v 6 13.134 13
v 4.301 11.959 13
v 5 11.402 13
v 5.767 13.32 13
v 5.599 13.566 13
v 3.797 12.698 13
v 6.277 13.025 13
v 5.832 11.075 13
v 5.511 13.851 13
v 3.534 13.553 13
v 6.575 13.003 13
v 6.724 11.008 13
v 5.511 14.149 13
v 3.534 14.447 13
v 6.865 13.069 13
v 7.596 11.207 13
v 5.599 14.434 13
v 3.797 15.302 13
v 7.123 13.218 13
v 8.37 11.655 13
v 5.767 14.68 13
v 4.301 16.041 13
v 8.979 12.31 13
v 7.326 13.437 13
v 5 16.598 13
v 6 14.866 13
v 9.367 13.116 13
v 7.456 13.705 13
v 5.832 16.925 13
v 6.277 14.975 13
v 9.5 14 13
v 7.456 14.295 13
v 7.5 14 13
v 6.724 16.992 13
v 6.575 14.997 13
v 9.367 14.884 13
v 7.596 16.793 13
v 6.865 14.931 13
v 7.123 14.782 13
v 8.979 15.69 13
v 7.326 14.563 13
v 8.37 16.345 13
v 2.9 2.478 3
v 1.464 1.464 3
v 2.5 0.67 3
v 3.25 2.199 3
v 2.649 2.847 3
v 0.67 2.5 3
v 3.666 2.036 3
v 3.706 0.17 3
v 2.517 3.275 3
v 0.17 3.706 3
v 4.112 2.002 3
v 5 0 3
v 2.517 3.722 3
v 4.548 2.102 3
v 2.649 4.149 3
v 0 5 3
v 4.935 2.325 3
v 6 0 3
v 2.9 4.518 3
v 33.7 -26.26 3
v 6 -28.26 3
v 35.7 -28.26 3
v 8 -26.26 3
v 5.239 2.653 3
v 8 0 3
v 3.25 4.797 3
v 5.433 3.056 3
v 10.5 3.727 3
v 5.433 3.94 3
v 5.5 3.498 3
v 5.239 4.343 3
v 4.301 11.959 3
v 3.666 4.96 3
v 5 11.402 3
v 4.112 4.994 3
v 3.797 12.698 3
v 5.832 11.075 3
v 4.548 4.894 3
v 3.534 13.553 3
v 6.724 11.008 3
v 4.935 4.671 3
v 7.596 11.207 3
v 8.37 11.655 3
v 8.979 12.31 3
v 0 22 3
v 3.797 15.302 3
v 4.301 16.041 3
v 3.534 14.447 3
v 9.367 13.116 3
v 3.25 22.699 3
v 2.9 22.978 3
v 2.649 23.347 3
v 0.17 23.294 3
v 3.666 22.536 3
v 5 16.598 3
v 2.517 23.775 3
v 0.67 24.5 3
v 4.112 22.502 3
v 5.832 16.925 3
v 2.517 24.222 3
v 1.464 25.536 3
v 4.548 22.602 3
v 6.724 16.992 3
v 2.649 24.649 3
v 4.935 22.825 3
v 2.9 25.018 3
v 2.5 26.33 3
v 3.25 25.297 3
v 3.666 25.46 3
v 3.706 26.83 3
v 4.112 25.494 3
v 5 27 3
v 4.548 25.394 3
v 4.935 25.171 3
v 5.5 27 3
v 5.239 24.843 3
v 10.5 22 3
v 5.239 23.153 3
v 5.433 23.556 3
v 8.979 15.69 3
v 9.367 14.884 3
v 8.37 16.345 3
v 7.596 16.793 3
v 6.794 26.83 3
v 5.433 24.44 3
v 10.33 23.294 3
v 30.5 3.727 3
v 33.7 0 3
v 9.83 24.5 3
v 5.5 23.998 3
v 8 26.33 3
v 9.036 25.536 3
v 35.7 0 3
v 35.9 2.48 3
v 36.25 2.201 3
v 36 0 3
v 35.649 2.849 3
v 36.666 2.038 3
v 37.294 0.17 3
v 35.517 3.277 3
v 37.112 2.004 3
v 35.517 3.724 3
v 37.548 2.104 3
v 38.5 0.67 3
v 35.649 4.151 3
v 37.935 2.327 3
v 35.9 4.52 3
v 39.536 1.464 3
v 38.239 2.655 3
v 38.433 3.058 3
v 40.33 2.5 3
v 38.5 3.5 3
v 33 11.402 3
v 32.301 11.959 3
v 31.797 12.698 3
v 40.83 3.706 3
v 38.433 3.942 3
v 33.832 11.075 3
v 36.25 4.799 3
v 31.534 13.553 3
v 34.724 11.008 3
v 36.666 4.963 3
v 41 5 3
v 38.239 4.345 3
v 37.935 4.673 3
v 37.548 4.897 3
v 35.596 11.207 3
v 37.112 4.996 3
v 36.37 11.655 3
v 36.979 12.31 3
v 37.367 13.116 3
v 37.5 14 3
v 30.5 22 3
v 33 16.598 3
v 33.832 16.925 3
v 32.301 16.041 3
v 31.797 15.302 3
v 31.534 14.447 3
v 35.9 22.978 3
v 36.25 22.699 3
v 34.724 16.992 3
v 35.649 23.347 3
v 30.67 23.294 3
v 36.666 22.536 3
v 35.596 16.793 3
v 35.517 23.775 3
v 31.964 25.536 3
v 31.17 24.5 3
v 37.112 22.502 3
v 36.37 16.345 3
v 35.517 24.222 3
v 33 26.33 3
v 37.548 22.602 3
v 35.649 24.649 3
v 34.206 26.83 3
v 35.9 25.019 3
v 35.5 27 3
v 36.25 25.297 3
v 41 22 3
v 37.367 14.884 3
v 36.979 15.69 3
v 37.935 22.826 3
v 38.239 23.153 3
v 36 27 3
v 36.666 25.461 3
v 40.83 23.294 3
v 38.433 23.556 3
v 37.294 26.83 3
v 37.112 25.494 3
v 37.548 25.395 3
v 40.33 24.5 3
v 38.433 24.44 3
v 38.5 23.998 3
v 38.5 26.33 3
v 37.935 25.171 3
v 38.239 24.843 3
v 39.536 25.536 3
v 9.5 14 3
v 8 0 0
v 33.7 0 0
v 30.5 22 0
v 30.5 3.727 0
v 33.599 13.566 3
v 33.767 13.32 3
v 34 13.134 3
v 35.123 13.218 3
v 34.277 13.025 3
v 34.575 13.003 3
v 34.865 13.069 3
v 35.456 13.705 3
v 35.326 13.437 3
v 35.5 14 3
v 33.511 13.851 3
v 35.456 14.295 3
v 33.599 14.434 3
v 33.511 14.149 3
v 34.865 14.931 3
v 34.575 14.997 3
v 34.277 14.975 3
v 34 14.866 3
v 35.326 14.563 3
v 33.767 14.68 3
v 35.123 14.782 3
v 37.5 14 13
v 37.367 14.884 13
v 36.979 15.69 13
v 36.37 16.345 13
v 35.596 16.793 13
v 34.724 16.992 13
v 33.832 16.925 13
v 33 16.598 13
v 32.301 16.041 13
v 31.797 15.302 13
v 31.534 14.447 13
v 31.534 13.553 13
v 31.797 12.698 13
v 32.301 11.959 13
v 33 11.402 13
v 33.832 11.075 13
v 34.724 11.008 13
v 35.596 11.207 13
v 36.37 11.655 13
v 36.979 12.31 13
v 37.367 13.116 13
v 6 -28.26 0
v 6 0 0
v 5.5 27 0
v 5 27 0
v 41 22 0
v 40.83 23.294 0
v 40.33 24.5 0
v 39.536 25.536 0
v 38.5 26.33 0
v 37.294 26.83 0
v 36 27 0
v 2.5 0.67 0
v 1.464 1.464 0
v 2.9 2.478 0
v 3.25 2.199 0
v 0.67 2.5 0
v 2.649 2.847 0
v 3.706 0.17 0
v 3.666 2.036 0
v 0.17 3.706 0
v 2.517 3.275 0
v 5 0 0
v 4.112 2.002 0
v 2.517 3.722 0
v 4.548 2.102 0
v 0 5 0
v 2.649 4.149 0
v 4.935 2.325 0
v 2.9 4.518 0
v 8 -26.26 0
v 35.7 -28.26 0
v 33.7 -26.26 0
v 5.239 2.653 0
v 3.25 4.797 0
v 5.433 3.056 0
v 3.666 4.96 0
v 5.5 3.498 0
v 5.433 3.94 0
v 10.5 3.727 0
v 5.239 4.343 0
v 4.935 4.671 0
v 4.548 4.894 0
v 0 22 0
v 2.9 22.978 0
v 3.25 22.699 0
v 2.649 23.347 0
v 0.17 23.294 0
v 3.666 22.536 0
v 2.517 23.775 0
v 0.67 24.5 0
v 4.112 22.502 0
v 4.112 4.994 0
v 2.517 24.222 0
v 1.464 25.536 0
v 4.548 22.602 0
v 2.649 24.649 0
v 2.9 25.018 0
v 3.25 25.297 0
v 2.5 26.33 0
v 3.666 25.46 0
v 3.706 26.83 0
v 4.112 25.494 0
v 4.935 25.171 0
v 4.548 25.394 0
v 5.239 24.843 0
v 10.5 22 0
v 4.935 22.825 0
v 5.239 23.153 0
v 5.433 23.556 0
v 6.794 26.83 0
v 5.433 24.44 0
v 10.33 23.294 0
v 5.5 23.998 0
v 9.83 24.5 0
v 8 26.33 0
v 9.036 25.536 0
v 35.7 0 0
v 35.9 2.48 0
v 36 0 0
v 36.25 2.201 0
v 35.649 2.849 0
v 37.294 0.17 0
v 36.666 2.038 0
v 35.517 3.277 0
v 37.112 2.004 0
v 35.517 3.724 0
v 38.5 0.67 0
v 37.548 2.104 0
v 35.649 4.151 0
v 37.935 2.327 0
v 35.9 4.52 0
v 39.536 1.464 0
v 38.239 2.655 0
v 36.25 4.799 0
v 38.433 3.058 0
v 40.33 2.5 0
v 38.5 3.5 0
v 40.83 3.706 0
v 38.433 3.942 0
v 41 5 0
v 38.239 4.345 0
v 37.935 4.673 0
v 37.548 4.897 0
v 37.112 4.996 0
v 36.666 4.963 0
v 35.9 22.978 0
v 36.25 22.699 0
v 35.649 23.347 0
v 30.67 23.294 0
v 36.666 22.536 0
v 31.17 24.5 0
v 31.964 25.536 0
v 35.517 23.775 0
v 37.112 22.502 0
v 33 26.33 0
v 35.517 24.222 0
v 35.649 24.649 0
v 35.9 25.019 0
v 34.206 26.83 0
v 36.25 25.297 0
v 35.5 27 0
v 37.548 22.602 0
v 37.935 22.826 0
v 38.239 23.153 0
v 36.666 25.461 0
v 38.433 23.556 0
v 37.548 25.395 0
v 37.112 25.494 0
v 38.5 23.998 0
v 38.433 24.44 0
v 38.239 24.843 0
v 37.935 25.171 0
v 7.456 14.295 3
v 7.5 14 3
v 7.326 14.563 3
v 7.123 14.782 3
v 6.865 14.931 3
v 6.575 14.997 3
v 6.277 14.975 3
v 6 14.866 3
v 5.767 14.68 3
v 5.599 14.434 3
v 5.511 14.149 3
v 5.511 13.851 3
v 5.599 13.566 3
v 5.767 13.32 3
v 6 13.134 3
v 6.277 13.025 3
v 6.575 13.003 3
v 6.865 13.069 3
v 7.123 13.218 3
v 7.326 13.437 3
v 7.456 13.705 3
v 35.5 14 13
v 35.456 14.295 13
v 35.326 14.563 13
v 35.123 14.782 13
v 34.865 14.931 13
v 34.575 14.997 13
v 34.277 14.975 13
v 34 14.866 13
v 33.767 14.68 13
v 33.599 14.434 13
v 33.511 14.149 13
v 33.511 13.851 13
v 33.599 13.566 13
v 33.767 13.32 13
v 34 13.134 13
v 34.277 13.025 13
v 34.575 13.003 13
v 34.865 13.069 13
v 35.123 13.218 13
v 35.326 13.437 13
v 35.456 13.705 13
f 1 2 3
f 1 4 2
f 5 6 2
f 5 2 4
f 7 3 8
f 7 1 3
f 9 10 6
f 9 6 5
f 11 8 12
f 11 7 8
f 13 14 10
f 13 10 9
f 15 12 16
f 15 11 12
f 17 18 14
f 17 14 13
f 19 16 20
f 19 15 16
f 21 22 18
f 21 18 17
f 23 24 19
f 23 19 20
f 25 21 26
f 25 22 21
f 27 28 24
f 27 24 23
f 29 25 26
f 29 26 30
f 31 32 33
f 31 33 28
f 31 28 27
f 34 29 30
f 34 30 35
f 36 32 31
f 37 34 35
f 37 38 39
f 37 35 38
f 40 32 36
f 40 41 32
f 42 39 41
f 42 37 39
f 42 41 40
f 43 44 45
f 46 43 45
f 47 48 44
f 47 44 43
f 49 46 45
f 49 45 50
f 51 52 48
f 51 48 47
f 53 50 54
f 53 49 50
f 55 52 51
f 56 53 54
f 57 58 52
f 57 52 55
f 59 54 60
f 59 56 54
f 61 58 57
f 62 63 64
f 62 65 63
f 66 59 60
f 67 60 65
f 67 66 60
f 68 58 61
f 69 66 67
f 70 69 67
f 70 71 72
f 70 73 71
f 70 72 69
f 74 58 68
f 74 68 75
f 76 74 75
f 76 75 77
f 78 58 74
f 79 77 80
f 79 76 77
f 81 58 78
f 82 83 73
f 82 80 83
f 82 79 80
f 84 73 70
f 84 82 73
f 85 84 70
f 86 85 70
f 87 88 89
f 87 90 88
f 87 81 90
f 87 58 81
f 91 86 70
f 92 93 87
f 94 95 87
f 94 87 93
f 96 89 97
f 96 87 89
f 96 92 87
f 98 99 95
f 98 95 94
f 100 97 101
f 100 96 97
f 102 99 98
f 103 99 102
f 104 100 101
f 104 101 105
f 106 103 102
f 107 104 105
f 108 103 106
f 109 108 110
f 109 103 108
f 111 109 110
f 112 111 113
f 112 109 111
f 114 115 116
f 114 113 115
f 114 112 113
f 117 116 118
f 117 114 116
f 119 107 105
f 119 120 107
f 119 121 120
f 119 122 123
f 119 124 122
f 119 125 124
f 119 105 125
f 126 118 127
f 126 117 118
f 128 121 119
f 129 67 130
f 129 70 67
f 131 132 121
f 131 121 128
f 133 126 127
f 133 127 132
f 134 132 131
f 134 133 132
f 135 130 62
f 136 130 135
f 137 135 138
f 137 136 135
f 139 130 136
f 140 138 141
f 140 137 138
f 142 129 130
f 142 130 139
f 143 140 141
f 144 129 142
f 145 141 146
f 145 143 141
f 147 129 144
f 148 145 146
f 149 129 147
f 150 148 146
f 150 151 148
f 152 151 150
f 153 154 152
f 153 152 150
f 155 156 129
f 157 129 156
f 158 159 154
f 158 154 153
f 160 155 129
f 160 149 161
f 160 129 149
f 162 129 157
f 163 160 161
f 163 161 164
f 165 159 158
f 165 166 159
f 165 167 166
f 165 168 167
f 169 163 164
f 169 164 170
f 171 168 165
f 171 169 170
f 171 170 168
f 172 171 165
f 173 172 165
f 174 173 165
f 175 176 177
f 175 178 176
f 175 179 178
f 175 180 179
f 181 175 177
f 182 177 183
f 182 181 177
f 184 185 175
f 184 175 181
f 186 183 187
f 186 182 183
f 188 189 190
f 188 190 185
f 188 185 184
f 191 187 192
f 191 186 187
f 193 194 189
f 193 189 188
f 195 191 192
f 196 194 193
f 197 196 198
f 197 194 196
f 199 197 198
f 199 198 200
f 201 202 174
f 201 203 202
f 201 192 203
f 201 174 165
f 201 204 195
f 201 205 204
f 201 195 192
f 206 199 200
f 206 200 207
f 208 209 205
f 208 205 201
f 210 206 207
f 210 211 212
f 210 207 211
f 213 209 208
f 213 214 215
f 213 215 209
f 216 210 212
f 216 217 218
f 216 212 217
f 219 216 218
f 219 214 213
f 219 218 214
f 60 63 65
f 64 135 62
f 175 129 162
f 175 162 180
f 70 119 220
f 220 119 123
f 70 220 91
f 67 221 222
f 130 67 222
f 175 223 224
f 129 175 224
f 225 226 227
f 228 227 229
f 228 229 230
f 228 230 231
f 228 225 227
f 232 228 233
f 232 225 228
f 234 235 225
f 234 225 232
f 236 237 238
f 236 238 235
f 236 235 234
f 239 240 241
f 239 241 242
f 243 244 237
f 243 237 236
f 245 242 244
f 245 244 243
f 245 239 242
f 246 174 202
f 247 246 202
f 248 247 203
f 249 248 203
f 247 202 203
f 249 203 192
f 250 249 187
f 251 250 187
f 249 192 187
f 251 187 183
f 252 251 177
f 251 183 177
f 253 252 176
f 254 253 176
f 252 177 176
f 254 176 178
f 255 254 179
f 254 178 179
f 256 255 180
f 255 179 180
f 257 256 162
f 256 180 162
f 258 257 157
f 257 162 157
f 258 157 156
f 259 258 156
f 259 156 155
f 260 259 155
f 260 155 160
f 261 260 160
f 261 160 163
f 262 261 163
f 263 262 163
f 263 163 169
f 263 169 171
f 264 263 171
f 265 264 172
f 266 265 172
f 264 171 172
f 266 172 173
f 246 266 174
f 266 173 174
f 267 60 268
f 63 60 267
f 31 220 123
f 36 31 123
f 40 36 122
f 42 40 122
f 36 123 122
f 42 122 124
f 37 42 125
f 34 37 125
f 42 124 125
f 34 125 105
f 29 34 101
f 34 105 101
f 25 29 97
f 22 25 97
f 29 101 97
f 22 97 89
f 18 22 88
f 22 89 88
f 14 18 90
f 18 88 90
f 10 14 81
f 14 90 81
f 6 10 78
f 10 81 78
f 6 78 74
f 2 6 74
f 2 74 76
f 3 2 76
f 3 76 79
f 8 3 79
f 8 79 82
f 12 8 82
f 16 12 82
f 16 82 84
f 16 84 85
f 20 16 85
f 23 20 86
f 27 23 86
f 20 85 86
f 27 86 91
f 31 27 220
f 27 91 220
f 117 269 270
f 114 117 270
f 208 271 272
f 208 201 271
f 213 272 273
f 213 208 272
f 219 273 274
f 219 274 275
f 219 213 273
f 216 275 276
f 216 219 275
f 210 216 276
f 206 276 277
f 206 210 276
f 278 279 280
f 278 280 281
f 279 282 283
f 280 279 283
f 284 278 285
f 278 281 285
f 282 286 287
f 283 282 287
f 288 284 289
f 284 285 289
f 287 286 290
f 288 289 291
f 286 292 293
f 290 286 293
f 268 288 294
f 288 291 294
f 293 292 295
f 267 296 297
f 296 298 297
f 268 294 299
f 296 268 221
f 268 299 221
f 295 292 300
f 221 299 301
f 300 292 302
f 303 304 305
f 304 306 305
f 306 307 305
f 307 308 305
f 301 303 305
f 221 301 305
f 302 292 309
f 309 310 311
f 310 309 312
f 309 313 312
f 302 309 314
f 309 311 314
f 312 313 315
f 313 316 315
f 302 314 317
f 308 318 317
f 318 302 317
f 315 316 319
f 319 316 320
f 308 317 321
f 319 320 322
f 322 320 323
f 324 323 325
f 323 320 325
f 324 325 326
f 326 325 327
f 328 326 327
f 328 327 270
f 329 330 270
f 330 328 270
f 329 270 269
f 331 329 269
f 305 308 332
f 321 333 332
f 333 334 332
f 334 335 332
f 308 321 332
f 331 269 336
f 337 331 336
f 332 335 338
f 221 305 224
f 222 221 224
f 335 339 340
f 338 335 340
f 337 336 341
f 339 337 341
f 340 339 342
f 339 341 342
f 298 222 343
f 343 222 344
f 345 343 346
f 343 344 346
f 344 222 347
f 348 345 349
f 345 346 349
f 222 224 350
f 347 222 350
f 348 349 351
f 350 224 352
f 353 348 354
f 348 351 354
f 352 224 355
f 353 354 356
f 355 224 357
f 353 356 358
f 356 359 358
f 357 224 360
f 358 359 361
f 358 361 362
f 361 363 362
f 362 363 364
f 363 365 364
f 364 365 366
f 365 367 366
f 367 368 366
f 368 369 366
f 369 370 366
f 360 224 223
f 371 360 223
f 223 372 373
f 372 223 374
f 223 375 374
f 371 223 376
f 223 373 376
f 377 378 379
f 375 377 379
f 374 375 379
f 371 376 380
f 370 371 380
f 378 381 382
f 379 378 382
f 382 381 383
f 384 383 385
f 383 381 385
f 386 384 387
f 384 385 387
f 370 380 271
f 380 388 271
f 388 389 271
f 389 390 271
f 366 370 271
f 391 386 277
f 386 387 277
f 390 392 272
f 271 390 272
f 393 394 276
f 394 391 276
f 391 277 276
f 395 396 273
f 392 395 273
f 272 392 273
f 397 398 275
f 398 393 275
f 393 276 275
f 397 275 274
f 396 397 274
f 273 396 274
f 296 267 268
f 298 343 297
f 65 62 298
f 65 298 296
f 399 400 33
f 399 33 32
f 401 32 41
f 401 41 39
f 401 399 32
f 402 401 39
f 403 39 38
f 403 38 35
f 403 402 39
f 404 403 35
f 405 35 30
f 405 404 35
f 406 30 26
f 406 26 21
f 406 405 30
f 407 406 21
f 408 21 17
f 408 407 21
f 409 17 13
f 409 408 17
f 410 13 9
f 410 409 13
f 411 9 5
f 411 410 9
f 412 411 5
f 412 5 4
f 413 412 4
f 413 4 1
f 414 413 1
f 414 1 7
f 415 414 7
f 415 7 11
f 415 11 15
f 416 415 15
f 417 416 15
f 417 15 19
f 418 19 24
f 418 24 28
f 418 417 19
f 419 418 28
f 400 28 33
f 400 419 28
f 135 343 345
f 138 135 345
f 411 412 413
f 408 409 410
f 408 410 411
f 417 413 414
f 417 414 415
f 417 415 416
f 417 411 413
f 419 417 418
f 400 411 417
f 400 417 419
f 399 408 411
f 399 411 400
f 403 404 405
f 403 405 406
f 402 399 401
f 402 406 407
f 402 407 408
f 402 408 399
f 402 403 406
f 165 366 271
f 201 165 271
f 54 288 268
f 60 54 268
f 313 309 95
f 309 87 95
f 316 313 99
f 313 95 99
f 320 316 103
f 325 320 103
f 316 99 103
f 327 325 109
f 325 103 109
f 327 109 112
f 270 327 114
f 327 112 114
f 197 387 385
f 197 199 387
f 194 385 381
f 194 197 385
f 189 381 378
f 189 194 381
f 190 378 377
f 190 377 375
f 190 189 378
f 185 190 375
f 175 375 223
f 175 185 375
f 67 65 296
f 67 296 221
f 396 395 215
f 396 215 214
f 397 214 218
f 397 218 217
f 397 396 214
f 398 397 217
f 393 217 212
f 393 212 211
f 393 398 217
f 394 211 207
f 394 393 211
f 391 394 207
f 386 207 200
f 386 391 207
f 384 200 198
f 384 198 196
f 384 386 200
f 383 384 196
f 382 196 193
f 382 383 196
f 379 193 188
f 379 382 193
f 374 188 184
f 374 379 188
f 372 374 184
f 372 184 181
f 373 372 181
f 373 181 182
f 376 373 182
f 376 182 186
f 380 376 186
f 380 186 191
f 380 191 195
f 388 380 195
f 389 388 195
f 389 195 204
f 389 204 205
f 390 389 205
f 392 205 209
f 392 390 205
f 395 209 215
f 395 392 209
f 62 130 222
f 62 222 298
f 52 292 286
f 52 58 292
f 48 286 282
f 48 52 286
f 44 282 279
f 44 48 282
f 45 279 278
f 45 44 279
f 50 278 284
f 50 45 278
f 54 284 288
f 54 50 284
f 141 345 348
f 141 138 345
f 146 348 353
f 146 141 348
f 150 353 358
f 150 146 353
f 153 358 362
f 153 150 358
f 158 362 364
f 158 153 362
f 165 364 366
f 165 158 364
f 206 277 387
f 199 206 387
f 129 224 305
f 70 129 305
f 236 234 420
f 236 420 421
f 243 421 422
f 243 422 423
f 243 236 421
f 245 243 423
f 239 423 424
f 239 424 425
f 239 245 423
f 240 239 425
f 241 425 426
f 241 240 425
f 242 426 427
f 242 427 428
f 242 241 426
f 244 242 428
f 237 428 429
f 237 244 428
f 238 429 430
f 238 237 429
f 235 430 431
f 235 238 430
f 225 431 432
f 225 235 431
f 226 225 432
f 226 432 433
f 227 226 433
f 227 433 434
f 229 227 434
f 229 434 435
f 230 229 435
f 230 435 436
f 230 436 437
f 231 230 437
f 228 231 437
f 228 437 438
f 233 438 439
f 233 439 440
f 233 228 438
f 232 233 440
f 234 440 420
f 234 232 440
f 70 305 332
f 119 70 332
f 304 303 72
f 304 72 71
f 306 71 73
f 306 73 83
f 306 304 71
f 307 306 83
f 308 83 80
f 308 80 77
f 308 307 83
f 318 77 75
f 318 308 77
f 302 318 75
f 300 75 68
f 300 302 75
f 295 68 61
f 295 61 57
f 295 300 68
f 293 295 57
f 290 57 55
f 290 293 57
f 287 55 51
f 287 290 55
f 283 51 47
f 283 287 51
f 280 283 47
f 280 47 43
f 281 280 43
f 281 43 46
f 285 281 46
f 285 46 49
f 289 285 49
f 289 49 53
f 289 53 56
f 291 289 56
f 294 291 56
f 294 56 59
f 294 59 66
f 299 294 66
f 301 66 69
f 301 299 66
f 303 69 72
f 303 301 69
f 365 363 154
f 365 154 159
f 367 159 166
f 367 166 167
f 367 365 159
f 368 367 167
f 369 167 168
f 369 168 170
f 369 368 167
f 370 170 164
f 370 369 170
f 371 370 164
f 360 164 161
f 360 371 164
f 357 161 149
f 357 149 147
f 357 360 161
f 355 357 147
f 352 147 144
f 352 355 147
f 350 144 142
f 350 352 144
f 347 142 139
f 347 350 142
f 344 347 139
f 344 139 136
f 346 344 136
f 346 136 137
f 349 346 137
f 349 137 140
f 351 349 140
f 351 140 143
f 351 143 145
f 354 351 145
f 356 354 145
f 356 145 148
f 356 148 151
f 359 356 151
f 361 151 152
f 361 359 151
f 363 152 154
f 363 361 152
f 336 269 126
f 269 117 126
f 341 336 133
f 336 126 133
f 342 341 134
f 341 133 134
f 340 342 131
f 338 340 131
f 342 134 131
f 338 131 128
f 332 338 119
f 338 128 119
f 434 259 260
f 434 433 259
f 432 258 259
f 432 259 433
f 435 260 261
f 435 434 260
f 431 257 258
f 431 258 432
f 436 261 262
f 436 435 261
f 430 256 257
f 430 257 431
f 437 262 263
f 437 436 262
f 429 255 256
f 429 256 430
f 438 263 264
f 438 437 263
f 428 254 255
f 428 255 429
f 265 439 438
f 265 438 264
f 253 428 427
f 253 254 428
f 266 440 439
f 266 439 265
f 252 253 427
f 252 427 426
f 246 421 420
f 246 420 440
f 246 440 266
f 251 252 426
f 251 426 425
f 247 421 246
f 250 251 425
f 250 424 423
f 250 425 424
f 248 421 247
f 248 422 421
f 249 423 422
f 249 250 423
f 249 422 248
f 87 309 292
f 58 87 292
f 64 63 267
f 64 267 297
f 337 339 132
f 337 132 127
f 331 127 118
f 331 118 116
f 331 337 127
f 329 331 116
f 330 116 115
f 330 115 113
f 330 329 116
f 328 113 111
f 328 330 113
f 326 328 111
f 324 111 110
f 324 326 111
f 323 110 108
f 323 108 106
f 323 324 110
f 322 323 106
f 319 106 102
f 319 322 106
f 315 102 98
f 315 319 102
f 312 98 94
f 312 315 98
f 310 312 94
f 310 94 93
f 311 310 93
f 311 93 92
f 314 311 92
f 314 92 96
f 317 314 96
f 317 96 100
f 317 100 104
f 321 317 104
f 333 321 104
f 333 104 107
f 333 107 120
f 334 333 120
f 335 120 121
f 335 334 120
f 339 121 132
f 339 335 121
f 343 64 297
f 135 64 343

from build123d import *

# Parameters (mm, degrees)
ESQUISSE1_R        = 1.5
BOSS_EXTRU_1_DEPTH = 3
ESQUISSE3_R        = 3
ESQUISSE3_R_2      = 1
BOSS_EXTRU_2_DEPTH = 10
CONG_1_R           = 5
BOSS_EXTRU_3_DEPTH = 3


with BuildPart() as part:
    # Esquisse1 → Boss.-Extru.1 (new body)
    with BuildSketch(Plane.XY):
        Polygon((0, 27), (0, 0), (5.65, 0), (7.65, 0), (7.700374591, 0), (16.027478889, 0), (33.35, 0), (35.35, 0), (41, 0), (41, 27), (30.5, 27), (30.5, 3.727272727), (10.5, 3.727272727), (10.5, 27), align=None)
        with Locations((4, 3.498076118)):
            Circle(ESQUISSE1_R, mode=Mode.SUBTRACT)
        with Locations((36.99999993, 3.500228257)):
            Circle(ESQUISSE1_R, mode=Mode.SUBTRACT)
        with Locations((4, 23.998076118)):
            Circle(ESQUISSE1_R, mode=Mode.SUBTRACT)
        with Locations((36.99999993, 23.998304375)):
            Circle(ESQUISSE1_R, mode=Mode.SUBTRACT)
    extrude(amount=BOSS_EXTRU_1_DEPTH)

    # Esquisse3 → Boss.-Extru.2 (add)
    with BuildSketch(Plane.XY.offset(3)):
        with Locations((6.5, 14)):
            Circle(ESQUISSE3_R)
        with Locations((6.5, 14)):
            Circle(ESQUISSE3_R_2, mode=Mode.SUBTRACT)
        with Locations((34.5, 14)):
            Circle(ESQUISSE3_R)
        with Locations((34.5, 14)):
            Circle(ESQUISSE3_R_2, mode=Mode.SUBTRACT)
    extrude(amount=BOSS_EXTRU_2_DEPTH)

    # Congé1
    cong_1_edges = [part.edges().sort_by_distance(p)[0] for p in [
        (30.5, 27, 1.5),
        (41, 27, 1.5),
        (41, 0, 1.5),
        (0, 0, 1.5),
        (0, 27, 1.5),
        (10.5, 27, 1.5),
    ]]
    fillet(cong_1_edges, radius=CONG_1_R)

    # Esquisse5 → Boss.-Extru.3 (add)
    with BuildSketch(Plane.XY.offset(3)):
        Polygon((8, 0), (6, 0), (6, -28.26), (35.7, -28.26), (35.7, 0), (33.7, 0), (33.7, -26.26), (8, -26.26), align=None)
    extrude(amount=-BOSS_EXTRU_3_DEPTH)


solid = part.part
